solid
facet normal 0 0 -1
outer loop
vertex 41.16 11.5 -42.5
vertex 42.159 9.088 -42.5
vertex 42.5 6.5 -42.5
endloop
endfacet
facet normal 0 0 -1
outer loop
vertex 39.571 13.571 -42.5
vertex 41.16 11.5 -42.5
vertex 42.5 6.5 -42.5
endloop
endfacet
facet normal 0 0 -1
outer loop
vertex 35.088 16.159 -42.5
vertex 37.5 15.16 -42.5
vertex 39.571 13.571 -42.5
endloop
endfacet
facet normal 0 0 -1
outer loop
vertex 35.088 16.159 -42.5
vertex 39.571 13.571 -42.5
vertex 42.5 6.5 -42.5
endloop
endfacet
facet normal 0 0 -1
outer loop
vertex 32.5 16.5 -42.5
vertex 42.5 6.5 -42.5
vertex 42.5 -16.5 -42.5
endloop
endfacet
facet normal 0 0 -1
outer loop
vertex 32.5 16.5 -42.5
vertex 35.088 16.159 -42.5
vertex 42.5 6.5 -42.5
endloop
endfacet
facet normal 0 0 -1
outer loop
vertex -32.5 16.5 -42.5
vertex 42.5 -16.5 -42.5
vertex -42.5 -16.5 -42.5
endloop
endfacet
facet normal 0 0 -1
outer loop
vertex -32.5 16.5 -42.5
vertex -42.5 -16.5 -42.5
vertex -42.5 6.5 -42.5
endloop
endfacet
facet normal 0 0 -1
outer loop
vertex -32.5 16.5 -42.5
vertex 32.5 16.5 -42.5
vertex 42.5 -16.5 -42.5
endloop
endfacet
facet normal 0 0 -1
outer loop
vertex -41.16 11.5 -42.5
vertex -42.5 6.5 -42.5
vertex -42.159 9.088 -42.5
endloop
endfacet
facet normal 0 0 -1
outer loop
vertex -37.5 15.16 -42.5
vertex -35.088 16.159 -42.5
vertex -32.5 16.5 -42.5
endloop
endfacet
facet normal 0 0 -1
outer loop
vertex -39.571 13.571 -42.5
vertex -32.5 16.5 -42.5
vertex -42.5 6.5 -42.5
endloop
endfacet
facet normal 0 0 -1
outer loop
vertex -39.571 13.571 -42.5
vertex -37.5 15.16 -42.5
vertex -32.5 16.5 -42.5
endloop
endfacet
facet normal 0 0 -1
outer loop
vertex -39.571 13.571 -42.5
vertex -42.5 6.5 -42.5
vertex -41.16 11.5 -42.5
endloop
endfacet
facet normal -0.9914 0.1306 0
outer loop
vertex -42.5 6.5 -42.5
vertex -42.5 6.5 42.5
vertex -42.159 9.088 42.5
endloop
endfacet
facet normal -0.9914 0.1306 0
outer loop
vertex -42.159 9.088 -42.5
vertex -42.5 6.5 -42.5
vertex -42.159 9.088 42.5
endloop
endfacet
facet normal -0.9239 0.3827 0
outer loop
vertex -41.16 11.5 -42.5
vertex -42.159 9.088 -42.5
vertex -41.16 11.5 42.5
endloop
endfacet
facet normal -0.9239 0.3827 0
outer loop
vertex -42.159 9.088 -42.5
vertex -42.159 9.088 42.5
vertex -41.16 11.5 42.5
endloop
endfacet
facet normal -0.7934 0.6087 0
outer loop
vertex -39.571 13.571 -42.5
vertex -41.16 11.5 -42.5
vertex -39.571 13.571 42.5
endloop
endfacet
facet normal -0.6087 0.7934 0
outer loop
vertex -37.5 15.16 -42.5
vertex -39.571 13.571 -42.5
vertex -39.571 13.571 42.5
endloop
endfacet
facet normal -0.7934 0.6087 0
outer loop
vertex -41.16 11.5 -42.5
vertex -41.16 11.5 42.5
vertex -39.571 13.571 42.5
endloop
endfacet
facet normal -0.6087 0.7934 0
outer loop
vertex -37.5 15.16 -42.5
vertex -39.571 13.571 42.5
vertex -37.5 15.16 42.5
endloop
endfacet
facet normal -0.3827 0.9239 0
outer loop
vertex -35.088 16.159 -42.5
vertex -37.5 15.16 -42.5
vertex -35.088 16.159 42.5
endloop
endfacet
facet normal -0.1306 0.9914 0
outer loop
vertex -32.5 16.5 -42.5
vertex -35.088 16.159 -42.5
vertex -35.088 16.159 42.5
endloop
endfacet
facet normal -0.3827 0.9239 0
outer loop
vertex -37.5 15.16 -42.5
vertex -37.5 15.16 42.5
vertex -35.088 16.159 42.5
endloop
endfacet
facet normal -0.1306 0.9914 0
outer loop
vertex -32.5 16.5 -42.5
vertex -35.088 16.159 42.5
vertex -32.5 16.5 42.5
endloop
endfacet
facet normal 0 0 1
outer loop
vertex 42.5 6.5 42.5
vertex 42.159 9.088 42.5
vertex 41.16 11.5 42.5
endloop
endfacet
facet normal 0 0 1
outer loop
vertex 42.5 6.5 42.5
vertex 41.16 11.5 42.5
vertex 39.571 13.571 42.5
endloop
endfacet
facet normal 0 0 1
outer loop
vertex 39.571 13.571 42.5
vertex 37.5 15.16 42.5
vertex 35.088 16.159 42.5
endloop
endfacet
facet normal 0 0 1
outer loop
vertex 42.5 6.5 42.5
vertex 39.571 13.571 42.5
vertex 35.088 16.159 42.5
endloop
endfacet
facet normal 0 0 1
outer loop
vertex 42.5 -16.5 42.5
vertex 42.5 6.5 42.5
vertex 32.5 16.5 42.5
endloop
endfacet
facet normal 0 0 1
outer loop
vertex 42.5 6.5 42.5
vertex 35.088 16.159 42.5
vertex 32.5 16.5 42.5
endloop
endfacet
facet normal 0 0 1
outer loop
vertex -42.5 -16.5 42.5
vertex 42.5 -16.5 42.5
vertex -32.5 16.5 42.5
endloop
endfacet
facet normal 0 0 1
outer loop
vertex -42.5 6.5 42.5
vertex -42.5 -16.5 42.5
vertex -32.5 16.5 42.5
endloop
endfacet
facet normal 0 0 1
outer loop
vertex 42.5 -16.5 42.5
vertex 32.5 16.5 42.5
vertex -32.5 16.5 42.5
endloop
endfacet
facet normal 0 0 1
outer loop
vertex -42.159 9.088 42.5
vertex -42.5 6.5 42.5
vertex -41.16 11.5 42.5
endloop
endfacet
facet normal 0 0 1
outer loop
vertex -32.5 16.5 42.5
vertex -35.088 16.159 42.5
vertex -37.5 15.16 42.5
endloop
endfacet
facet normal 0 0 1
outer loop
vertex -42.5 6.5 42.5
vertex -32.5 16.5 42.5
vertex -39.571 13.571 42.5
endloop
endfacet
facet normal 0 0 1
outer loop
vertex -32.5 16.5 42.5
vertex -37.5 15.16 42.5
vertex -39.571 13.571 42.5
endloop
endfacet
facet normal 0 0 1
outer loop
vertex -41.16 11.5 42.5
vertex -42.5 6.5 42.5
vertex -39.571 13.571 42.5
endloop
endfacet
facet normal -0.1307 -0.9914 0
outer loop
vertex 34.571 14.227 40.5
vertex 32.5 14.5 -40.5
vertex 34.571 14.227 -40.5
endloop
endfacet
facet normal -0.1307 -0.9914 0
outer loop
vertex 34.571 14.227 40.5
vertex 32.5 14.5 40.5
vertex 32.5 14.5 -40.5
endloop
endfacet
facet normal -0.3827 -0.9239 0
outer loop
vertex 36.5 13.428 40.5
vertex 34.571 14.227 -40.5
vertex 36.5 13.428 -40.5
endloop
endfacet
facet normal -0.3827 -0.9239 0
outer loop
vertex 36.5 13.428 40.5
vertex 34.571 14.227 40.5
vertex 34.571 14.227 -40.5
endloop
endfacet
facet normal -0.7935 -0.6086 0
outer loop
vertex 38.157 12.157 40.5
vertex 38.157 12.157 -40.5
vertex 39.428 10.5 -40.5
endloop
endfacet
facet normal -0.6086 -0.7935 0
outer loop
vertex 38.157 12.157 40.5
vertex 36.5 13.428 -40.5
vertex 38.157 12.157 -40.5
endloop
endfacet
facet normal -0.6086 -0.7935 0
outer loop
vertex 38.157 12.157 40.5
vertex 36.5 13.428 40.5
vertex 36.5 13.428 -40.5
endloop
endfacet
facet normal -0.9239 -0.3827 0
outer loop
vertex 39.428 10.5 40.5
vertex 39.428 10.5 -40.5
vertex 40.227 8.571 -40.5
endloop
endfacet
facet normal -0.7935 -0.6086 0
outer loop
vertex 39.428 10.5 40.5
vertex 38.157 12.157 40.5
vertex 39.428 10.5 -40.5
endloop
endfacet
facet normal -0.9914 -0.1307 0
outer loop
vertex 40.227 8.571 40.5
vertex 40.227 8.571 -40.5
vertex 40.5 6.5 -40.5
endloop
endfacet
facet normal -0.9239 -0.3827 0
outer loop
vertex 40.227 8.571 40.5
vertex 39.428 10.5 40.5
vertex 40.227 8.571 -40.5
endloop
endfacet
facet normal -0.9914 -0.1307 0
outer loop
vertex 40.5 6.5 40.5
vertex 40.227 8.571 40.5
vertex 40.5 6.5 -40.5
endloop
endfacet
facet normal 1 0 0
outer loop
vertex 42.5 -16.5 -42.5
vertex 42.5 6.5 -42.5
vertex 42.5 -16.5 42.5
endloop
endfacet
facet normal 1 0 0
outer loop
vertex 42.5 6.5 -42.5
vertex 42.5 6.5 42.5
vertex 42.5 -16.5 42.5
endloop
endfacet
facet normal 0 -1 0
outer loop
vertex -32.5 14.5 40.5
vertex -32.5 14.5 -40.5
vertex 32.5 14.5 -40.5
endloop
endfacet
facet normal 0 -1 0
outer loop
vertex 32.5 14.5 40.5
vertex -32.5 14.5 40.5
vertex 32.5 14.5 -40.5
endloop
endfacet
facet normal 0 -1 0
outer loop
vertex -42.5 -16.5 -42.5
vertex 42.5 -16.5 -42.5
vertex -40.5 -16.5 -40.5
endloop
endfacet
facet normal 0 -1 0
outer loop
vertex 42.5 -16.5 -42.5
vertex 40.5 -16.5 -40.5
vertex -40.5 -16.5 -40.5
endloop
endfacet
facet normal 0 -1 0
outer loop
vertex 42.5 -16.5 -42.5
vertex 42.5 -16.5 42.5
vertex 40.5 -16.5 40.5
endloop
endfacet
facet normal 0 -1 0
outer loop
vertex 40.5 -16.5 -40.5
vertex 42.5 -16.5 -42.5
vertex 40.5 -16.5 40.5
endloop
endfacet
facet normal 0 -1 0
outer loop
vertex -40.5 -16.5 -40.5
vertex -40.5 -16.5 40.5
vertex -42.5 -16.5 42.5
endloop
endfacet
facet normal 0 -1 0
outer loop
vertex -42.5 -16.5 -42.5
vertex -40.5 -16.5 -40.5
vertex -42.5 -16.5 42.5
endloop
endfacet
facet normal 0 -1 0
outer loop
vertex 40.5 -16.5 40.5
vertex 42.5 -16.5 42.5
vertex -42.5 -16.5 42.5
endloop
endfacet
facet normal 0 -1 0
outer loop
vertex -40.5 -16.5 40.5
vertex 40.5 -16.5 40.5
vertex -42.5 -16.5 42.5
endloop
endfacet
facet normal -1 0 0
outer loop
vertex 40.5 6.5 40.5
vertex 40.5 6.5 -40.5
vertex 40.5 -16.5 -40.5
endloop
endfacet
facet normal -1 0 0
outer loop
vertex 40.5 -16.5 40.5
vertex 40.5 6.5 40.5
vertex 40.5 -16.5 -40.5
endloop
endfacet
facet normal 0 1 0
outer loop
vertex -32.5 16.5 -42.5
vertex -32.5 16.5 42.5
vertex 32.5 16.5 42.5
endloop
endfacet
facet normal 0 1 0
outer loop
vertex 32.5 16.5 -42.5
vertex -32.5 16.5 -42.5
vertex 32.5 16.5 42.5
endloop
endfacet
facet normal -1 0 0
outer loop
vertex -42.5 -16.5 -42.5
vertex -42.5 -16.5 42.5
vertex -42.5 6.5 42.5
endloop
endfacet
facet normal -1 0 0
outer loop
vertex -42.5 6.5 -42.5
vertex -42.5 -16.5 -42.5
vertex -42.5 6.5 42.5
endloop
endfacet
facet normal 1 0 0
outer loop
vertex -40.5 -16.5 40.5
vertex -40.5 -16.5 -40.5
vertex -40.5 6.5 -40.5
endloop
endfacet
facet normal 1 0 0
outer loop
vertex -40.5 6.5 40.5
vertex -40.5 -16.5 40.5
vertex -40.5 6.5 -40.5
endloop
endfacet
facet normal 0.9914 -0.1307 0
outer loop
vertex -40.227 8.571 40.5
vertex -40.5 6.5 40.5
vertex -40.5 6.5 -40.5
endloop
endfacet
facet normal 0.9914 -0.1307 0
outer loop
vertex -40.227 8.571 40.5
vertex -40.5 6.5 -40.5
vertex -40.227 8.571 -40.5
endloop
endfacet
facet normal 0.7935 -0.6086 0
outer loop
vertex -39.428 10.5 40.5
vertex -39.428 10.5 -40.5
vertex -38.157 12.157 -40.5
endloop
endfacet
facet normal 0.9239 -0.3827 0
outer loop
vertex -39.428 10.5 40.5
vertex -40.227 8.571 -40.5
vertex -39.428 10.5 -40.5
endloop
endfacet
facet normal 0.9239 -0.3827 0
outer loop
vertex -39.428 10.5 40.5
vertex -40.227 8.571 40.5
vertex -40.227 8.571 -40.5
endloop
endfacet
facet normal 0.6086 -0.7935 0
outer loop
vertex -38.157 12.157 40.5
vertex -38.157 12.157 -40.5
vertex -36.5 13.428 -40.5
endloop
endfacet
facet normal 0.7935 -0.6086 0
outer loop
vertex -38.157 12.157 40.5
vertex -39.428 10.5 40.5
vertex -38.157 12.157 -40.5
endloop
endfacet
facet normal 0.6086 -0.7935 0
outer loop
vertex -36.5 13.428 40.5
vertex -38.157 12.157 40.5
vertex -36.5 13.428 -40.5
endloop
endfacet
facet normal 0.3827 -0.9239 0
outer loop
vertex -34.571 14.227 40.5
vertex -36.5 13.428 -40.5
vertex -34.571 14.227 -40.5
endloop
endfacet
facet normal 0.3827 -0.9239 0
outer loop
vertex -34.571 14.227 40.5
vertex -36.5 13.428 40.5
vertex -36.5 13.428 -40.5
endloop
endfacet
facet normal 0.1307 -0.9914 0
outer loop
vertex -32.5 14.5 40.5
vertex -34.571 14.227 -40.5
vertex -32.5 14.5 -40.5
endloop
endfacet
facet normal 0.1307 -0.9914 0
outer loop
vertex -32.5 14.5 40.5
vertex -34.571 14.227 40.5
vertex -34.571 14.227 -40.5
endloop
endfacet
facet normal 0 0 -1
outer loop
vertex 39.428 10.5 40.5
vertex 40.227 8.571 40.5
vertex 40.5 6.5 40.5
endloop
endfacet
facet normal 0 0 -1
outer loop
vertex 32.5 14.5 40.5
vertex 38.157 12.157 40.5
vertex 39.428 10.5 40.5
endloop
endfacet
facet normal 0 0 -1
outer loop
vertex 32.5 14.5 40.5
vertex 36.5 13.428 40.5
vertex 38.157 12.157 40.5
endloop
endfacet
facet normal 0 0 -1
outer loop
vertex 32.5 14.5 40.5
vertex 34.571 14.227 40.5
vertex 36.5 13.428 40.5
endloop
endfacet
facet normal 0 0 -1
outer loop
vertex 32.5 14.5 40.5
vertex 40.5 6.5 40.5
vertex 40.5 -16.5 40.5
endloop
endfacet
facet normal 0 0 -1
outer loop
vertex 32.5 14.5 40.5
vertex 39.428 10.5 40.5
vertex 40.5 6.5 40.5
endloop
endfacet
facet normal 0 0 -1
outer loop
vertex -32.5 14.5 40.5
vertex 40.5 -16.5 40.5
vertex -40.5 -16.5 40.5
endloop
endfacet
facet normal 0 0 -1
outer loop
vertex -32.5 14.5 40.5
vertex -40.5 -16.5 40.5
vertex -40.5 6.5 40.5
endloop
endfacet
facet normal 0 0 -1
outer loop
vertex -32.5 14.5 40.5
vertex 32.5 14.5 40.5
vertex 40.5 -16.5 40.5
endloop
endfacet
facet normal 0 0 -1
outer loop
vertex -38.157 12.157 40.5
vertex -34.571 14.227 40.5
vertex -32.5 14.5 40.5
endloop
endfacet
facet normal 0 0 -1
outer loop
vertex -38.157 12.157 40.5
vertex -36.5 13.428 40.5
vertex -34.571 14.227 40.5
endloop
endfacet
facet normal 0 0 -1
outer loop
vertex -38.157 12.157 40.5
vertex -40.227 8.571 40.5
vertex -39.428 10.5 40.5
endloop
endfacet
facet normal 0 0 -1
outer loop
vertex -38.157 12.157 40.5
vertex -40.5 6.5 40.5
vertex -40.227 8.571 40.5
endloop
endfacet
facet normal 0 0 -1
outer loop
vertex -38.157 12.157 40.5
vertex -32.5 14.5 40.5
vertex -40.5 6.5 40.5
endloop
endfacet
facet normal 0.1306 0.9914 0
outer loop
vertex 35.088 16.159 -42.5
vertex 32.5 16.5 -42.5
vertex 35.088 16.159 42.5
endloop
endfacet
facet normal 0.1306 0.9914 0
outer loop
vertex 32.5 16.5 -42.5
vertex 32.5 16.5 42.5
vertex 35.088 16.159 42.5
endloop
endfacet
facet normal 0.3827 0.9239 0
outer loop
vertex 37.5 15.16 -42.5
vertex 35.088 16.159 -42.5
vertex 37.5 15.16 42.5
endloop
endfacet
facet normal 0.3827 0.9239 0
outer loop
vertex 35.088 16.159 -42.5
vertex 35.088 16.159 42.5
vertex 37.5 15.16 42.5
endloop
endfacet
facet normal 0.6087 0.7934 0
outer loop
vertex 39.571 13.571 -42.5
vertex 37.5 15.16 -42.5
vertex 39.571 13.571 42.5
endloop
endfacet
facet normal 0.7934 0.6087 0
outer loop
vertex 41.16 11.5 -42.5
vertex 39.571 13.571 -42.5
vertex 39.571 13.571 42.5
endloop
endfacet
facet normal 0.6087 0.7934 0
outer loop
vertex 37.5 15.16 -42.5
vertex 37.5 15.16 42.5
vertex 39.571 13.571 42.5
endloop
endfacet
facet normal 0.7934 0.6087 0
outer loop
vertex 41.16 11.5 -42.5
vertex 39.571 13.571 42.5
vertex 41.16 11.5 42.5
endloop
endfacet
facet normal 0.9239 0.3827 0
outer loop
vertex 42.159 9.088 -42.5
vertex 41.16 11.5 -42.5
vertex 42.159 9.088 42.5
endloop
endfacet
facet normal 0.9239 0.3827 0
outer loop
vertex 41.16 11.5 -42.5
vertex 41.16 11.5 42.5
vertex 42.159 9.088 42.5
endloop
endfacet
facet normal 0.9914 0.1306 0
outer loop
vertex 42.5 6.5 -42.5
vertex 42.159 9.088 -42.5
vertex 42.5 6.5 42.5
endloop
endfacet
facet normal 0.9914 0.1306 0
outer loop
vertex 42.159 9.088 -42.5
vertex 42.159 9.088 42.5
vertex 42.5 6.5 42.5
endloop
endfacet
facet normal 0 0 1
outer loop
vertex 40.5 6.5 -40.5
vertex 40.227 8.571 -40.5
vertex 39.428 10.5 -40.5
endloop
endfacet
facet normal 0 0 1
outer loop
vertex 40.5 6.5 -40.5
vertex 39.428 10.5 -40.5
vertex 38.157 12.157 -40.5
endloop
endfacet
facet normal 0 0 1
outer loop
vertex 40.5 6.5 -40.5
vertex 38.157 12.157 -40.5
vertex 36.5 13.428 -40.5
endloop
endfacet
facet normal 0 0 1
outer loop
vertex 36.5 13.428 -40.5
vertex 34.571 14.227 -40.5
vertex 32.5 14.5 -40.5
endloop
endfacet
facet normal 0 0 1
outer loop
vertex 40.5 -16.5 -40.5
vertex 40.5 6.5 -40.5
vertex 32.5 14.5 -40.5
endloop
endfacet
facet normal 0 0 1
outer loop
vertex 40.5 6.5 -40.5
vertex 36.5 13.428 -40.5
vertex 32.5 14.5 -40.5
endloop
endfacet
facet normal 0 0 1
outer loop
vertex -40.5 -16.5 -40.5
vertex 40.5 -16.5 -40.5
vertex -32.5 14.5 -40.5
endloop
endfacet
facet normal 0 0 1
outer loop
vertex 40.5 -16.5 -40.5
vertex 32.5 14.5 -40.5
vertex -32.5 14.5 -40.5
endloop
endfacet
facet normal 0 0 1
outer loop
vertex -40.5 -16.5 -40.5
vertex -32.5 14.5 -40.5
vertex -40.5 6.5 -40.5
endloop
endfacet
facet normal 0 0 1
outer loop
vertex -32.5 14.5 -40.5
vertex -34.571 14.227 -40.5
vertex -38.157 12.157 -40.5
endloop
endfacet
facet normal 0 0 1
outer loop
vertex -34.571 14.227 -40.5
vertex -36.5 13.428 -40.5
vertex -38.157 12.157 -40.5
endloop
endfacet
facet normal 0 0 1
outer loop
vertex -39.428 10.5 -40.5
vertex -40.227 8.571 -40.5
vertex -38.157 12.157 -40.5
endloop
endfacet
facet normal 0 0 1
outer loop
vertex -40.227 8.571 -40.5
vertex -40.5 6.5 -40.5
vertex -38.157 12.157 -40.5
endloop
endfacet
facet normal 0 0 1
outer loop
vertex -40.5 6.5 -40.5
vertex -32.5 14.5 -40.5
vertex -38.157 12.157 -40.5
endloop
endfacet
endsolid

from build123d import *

# Parameters (mm, degrees)
BOSS_EXTRUDE1_DEPTH = 42.5
SHELL1_T            = -2


with BuildPart() as part:
    # Sketch3 → Boss-Extrude1 (new, symmetric)
    with BuildSketch(Plane.XY):
        with BuildLine():
            Line((-32.5, 16.5), (32.5, 16.5))
            ThreePointArc((32.5, 16.5), (39.571067812, 13.571067812), (42.5, 6.5))
            Line((42.5, 6.5), (42.5, -16.5))
            Line((42.5, -16.5), (-42.5, -16.5))
            Line((-42.5, -16.5), (-42.5, 6.5))
            ThreePointArc((-42.5, 6.5), (-39.571067812, 13.571067812), (-32.5, 16.5))
        make_face()
    extrude(amount=BOSS_EXTRUDE1_DEPTH, both=True)

    # Shell1
    shell1_openings = [part.faces().sort_by_distance(p)[0] for p in [
        (0, -16.5, 0),
    ]]
    offset(amount=SHELL1_T, openings=shell1_openings, kind=Kind.INTERSECTION)


solid = part.part
